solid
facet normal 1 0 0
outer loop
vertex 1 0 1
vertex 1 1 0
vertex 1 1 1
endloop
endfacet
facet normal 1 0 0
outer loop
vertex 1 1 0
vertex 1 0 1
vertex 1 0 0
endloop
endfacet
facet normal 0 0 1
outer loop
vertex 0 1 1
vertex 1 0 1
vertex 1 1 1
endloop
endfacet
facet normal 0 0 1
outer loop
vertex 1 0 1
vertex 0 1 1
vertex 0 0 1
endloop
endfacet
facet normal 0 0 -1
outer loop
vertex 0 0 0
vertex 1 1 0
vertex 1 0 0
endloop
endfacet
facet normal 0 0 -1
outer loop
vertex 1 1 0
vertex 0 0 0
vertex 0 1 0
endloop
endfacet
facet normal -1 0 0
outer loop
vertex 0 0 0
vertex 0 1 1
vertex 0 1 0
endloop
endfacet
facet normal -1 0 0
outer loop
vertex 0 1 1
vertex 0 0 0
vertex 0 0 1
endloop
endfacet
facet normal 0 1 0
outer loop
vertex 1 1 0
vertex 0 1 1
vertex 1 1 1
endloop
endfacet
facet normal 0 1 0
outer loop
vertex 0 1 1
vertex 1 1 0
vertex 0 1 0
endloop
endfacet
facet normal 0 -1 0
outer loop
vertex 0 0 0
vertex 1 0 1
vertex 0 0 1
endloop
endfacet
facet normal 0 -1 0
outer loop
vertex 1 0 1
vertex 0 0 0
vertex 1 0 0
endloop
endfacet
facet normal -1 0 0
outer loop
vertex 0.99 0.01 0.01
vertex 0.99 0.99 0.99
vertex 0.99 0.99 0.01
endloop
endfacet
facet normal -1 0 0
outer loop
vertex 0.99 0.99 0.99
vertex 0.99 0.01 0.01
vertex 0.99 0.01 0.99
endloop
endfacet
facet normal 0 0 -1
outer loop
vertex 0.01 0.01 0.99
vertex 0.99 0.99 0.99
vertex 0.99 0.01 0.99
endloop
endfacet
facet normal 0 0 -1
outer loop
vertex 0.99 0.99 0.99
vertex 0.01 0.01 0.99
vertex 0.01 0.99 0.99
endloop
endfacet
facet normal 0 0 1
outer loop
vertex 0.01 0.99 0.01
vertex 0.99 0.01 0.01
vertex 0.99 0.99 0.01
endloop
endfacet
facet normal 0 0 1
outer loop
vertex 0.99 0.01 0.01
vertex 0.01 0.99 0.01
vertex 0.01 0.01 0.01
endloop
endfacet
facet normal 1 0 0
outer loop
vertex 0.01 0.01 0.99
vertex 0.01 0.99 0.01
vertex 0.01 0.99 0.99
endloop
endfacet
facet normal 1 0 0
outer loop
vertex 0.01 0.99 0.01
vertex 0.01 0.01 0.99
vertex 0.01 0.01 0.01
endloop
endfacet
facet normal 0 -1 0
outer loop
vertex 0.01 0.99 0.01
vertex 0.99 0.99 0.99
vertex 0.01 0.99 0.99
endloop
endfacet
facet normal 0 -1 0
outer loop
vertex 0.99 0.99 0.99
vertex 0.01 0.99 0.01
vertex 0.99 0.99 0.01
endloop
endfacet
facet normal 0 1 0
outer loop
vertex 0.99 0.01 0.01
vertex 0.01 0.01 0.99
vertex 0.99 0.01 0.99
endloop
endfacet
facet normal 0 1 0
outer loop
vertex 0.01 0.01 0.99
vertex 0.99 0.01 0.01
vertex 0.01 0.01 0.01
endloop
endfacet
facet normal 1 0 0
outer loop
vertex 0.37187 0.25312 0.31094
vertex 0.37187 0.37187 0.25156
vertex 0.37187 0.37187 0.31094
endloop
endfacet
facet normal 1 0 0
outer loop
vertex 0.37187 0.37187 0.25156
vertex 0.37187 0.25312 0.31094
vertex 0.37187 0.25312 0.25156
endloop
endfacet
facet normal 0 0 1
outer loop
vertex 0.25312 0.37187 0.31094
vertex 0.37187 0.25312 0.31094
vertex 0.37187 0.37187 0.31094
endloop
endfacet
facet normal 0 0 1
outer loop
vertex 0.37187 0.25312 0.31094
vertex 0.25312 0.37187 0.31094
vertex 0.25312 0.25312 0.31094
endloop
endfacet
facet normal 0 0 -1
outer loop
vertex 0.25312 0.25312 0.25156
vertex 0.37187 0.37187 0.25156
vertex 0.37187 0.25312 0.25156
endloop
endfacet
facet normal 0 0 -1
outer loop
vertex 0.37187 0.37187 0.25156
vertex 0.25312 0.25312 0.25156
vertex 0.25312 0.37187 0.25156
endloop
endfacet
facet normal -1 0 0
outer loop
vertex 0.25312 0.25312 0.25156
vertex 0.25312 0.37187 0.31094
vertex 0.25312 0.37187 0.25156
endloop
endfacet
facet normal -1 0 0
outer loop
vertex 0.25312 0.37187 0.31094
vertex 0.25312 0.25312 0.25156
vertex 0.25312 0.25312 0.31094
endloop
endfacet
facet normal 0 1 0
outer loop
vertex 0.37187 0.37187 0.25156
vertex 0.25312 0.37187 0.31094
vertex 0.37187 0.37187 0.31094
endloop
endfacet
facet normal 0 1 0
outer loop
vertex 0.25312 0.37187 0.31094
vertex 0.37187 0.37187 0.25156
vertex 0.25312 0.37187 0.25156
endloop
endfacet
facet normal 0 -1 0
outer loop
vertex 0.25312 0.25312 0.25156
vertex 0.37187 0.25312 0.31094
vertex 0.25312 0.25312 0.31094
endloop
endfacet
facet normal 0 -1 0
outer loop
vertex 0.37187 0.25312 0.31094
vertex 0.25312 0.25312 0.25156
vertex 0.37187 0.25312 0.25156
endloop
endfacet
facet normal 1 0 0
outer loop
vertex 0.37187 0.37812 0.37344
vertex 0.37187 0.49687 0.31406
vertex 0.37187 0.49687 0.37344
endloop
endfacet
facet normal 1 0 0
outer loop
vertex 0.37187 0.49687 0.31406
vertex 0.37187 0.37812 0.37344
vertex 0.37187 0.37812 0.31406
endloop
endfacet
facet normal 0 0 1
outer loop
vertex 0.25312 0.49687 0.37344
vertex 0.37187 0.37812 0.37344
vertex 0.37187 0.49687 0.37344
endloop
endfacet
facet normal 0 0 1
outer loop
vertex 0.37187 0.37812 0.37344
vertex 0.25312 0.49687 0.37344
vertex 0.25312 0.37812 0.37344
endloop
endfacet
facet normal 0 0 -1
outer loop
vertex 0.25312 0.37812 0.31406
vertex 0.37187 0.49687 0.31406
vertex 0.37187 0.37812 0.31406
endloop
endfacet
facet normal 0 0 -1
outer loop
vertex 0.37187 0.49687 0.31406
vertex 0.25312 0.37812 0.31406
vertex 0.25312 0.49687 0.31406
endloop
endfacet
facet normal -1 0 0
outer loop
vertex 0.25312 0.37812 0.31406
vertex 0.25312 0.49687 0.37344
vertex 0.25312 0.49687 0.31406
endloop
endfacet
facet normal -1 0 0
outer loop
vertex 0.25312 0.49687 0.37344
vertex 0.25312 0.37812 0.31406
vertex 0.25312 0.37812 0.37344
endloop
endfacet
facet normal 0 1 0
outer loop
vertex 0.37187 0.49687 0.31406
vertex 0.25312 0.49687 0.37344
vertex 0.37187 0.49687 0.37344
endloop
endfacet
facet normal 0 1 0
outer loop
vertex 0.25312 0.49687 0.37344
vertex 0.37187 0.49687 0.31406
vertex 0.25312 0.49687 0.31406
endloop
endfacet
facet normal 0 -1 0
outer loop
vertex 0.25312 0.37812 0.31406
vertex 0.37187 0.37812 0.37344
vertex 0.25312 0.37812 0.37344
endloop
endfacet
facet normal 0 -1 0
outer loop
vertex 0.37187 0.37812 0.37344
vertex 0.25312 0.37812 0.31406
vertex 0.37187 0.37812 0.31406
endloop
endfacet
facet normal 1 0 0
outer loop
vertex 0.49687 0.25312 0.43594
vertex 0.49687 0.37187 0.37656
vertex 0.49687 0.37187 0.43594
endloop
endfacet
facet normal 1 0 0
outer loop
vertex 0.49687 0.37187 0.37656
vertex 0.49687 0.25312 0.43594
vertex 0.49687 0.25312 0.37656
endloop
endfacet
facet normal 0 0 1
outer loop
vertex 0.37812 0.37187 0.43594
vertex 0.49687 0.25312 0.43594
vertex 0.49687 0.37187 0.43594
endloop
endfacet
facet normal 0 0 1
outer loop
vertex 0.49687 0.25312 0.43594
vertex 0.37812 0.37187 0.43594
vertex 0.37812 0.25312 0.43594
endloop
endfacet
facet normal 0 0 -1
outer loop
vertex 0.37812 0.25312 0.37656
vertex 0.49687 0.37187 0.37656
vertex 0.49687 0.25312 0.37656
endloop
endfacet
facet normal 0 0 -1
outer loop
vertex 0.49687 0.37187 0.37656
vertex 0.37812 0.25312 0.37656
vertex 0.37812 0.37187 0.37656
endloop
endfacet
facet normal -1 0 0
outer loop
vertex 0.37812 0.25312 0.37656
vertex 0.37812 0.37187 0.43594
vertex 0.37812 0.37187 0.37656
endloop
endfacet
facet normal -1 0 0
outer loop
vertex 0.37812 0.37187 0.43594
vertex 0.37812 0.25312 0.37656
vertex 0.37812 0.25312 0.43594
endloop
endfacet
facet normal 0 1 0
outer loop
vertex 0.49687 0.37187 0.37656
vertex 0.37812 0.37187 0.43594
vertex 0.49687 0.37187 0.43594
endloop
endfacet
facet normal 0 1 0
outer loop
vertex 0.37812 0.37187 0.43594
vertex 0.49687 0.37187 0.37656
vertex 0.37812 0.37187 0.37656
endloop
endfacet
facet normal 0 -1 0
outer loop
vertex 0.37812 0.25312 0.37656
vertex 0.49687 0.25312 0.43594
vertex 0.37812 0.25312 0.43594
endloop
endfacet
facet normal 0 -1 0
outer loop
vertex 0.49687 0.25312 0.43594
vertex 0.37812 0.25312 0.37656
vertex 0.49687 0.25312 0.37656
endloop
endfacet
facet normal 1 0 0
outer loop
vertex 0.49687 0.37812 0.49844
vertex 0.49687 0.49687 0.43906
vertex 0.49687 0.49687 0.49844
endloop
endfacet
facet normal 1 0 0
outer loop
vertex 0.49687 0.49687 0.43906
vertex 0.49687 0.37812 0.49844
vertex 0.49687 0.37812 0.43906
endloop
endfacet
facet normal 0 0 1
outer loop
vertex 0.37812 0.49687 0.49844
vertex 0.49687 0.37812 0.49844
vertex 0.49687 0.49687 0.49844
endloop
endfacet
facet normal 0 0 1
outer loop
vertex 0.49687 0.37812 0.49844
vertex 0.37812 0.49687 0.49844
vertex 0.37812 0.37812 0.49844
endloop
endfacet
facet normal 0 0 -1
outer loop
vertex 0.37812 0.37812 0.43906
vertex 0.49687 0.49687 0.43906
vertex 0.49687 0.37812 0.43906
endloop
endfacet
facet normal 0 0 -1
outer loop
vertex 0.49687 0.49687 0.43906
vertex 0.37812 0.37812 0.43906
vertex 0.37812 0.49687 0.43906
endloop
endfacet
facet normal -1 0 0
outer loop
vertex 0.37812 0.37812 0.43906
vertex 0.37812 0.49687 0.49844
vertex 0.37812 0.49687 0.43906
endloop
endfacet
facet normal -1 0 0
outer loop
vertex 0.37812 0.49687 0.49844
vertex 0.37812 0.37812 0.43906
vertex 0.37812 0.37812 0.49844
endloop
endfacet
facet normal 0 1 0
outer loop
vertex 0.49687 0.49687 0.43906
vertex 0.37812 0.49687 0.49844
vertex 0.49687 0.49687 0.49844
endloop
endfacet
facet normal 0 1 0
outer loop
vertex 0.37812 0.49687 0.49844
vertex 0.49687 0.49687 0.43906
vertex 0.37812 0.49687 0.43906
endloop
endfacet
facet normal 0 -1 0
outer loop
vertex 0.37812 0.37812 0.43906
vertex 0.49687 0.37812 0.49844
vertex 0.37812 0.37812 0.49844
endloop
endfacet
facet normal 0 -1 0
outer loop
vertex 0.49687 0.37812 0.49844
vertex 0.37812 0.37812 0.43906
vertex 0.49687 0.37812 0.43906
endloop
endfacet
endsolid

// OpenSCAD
translate([0.3125, 0.3125, 0.28125]) color([0.7565823833812777, 0.2079660995759225, 0.10719977146924453]) cube([0.11875, 0.11875, 0.059375], center=true);
translate([0.3125, 0.4375, 0.34375]) color([0.12810772743771714, 0.798813179036526, 0.10112610105346276]) cube([0.11875, 0.11875, 0.059375], center=true);
translate([0.4375, 0.3125, 0.40625]) color([0.5974375438561572, 0.8488323740985618, 0.15852232646816133]) cube([0.11875, 0.11875, 0.059375], center=true);
translate([0.4375, 0.4375, 0.46875]) color([0.5978740169757398, 0.8681420391372784, 0.46112476133502645]) cube([0.11875, 0.11875, 0.059375], center=true);
color([0.3,0.3,0.3,0.3]) difference() { cube([1,1,1]); translate([0.01,0.01,0.01]) cube([0.98,0.98,0.98]); }
